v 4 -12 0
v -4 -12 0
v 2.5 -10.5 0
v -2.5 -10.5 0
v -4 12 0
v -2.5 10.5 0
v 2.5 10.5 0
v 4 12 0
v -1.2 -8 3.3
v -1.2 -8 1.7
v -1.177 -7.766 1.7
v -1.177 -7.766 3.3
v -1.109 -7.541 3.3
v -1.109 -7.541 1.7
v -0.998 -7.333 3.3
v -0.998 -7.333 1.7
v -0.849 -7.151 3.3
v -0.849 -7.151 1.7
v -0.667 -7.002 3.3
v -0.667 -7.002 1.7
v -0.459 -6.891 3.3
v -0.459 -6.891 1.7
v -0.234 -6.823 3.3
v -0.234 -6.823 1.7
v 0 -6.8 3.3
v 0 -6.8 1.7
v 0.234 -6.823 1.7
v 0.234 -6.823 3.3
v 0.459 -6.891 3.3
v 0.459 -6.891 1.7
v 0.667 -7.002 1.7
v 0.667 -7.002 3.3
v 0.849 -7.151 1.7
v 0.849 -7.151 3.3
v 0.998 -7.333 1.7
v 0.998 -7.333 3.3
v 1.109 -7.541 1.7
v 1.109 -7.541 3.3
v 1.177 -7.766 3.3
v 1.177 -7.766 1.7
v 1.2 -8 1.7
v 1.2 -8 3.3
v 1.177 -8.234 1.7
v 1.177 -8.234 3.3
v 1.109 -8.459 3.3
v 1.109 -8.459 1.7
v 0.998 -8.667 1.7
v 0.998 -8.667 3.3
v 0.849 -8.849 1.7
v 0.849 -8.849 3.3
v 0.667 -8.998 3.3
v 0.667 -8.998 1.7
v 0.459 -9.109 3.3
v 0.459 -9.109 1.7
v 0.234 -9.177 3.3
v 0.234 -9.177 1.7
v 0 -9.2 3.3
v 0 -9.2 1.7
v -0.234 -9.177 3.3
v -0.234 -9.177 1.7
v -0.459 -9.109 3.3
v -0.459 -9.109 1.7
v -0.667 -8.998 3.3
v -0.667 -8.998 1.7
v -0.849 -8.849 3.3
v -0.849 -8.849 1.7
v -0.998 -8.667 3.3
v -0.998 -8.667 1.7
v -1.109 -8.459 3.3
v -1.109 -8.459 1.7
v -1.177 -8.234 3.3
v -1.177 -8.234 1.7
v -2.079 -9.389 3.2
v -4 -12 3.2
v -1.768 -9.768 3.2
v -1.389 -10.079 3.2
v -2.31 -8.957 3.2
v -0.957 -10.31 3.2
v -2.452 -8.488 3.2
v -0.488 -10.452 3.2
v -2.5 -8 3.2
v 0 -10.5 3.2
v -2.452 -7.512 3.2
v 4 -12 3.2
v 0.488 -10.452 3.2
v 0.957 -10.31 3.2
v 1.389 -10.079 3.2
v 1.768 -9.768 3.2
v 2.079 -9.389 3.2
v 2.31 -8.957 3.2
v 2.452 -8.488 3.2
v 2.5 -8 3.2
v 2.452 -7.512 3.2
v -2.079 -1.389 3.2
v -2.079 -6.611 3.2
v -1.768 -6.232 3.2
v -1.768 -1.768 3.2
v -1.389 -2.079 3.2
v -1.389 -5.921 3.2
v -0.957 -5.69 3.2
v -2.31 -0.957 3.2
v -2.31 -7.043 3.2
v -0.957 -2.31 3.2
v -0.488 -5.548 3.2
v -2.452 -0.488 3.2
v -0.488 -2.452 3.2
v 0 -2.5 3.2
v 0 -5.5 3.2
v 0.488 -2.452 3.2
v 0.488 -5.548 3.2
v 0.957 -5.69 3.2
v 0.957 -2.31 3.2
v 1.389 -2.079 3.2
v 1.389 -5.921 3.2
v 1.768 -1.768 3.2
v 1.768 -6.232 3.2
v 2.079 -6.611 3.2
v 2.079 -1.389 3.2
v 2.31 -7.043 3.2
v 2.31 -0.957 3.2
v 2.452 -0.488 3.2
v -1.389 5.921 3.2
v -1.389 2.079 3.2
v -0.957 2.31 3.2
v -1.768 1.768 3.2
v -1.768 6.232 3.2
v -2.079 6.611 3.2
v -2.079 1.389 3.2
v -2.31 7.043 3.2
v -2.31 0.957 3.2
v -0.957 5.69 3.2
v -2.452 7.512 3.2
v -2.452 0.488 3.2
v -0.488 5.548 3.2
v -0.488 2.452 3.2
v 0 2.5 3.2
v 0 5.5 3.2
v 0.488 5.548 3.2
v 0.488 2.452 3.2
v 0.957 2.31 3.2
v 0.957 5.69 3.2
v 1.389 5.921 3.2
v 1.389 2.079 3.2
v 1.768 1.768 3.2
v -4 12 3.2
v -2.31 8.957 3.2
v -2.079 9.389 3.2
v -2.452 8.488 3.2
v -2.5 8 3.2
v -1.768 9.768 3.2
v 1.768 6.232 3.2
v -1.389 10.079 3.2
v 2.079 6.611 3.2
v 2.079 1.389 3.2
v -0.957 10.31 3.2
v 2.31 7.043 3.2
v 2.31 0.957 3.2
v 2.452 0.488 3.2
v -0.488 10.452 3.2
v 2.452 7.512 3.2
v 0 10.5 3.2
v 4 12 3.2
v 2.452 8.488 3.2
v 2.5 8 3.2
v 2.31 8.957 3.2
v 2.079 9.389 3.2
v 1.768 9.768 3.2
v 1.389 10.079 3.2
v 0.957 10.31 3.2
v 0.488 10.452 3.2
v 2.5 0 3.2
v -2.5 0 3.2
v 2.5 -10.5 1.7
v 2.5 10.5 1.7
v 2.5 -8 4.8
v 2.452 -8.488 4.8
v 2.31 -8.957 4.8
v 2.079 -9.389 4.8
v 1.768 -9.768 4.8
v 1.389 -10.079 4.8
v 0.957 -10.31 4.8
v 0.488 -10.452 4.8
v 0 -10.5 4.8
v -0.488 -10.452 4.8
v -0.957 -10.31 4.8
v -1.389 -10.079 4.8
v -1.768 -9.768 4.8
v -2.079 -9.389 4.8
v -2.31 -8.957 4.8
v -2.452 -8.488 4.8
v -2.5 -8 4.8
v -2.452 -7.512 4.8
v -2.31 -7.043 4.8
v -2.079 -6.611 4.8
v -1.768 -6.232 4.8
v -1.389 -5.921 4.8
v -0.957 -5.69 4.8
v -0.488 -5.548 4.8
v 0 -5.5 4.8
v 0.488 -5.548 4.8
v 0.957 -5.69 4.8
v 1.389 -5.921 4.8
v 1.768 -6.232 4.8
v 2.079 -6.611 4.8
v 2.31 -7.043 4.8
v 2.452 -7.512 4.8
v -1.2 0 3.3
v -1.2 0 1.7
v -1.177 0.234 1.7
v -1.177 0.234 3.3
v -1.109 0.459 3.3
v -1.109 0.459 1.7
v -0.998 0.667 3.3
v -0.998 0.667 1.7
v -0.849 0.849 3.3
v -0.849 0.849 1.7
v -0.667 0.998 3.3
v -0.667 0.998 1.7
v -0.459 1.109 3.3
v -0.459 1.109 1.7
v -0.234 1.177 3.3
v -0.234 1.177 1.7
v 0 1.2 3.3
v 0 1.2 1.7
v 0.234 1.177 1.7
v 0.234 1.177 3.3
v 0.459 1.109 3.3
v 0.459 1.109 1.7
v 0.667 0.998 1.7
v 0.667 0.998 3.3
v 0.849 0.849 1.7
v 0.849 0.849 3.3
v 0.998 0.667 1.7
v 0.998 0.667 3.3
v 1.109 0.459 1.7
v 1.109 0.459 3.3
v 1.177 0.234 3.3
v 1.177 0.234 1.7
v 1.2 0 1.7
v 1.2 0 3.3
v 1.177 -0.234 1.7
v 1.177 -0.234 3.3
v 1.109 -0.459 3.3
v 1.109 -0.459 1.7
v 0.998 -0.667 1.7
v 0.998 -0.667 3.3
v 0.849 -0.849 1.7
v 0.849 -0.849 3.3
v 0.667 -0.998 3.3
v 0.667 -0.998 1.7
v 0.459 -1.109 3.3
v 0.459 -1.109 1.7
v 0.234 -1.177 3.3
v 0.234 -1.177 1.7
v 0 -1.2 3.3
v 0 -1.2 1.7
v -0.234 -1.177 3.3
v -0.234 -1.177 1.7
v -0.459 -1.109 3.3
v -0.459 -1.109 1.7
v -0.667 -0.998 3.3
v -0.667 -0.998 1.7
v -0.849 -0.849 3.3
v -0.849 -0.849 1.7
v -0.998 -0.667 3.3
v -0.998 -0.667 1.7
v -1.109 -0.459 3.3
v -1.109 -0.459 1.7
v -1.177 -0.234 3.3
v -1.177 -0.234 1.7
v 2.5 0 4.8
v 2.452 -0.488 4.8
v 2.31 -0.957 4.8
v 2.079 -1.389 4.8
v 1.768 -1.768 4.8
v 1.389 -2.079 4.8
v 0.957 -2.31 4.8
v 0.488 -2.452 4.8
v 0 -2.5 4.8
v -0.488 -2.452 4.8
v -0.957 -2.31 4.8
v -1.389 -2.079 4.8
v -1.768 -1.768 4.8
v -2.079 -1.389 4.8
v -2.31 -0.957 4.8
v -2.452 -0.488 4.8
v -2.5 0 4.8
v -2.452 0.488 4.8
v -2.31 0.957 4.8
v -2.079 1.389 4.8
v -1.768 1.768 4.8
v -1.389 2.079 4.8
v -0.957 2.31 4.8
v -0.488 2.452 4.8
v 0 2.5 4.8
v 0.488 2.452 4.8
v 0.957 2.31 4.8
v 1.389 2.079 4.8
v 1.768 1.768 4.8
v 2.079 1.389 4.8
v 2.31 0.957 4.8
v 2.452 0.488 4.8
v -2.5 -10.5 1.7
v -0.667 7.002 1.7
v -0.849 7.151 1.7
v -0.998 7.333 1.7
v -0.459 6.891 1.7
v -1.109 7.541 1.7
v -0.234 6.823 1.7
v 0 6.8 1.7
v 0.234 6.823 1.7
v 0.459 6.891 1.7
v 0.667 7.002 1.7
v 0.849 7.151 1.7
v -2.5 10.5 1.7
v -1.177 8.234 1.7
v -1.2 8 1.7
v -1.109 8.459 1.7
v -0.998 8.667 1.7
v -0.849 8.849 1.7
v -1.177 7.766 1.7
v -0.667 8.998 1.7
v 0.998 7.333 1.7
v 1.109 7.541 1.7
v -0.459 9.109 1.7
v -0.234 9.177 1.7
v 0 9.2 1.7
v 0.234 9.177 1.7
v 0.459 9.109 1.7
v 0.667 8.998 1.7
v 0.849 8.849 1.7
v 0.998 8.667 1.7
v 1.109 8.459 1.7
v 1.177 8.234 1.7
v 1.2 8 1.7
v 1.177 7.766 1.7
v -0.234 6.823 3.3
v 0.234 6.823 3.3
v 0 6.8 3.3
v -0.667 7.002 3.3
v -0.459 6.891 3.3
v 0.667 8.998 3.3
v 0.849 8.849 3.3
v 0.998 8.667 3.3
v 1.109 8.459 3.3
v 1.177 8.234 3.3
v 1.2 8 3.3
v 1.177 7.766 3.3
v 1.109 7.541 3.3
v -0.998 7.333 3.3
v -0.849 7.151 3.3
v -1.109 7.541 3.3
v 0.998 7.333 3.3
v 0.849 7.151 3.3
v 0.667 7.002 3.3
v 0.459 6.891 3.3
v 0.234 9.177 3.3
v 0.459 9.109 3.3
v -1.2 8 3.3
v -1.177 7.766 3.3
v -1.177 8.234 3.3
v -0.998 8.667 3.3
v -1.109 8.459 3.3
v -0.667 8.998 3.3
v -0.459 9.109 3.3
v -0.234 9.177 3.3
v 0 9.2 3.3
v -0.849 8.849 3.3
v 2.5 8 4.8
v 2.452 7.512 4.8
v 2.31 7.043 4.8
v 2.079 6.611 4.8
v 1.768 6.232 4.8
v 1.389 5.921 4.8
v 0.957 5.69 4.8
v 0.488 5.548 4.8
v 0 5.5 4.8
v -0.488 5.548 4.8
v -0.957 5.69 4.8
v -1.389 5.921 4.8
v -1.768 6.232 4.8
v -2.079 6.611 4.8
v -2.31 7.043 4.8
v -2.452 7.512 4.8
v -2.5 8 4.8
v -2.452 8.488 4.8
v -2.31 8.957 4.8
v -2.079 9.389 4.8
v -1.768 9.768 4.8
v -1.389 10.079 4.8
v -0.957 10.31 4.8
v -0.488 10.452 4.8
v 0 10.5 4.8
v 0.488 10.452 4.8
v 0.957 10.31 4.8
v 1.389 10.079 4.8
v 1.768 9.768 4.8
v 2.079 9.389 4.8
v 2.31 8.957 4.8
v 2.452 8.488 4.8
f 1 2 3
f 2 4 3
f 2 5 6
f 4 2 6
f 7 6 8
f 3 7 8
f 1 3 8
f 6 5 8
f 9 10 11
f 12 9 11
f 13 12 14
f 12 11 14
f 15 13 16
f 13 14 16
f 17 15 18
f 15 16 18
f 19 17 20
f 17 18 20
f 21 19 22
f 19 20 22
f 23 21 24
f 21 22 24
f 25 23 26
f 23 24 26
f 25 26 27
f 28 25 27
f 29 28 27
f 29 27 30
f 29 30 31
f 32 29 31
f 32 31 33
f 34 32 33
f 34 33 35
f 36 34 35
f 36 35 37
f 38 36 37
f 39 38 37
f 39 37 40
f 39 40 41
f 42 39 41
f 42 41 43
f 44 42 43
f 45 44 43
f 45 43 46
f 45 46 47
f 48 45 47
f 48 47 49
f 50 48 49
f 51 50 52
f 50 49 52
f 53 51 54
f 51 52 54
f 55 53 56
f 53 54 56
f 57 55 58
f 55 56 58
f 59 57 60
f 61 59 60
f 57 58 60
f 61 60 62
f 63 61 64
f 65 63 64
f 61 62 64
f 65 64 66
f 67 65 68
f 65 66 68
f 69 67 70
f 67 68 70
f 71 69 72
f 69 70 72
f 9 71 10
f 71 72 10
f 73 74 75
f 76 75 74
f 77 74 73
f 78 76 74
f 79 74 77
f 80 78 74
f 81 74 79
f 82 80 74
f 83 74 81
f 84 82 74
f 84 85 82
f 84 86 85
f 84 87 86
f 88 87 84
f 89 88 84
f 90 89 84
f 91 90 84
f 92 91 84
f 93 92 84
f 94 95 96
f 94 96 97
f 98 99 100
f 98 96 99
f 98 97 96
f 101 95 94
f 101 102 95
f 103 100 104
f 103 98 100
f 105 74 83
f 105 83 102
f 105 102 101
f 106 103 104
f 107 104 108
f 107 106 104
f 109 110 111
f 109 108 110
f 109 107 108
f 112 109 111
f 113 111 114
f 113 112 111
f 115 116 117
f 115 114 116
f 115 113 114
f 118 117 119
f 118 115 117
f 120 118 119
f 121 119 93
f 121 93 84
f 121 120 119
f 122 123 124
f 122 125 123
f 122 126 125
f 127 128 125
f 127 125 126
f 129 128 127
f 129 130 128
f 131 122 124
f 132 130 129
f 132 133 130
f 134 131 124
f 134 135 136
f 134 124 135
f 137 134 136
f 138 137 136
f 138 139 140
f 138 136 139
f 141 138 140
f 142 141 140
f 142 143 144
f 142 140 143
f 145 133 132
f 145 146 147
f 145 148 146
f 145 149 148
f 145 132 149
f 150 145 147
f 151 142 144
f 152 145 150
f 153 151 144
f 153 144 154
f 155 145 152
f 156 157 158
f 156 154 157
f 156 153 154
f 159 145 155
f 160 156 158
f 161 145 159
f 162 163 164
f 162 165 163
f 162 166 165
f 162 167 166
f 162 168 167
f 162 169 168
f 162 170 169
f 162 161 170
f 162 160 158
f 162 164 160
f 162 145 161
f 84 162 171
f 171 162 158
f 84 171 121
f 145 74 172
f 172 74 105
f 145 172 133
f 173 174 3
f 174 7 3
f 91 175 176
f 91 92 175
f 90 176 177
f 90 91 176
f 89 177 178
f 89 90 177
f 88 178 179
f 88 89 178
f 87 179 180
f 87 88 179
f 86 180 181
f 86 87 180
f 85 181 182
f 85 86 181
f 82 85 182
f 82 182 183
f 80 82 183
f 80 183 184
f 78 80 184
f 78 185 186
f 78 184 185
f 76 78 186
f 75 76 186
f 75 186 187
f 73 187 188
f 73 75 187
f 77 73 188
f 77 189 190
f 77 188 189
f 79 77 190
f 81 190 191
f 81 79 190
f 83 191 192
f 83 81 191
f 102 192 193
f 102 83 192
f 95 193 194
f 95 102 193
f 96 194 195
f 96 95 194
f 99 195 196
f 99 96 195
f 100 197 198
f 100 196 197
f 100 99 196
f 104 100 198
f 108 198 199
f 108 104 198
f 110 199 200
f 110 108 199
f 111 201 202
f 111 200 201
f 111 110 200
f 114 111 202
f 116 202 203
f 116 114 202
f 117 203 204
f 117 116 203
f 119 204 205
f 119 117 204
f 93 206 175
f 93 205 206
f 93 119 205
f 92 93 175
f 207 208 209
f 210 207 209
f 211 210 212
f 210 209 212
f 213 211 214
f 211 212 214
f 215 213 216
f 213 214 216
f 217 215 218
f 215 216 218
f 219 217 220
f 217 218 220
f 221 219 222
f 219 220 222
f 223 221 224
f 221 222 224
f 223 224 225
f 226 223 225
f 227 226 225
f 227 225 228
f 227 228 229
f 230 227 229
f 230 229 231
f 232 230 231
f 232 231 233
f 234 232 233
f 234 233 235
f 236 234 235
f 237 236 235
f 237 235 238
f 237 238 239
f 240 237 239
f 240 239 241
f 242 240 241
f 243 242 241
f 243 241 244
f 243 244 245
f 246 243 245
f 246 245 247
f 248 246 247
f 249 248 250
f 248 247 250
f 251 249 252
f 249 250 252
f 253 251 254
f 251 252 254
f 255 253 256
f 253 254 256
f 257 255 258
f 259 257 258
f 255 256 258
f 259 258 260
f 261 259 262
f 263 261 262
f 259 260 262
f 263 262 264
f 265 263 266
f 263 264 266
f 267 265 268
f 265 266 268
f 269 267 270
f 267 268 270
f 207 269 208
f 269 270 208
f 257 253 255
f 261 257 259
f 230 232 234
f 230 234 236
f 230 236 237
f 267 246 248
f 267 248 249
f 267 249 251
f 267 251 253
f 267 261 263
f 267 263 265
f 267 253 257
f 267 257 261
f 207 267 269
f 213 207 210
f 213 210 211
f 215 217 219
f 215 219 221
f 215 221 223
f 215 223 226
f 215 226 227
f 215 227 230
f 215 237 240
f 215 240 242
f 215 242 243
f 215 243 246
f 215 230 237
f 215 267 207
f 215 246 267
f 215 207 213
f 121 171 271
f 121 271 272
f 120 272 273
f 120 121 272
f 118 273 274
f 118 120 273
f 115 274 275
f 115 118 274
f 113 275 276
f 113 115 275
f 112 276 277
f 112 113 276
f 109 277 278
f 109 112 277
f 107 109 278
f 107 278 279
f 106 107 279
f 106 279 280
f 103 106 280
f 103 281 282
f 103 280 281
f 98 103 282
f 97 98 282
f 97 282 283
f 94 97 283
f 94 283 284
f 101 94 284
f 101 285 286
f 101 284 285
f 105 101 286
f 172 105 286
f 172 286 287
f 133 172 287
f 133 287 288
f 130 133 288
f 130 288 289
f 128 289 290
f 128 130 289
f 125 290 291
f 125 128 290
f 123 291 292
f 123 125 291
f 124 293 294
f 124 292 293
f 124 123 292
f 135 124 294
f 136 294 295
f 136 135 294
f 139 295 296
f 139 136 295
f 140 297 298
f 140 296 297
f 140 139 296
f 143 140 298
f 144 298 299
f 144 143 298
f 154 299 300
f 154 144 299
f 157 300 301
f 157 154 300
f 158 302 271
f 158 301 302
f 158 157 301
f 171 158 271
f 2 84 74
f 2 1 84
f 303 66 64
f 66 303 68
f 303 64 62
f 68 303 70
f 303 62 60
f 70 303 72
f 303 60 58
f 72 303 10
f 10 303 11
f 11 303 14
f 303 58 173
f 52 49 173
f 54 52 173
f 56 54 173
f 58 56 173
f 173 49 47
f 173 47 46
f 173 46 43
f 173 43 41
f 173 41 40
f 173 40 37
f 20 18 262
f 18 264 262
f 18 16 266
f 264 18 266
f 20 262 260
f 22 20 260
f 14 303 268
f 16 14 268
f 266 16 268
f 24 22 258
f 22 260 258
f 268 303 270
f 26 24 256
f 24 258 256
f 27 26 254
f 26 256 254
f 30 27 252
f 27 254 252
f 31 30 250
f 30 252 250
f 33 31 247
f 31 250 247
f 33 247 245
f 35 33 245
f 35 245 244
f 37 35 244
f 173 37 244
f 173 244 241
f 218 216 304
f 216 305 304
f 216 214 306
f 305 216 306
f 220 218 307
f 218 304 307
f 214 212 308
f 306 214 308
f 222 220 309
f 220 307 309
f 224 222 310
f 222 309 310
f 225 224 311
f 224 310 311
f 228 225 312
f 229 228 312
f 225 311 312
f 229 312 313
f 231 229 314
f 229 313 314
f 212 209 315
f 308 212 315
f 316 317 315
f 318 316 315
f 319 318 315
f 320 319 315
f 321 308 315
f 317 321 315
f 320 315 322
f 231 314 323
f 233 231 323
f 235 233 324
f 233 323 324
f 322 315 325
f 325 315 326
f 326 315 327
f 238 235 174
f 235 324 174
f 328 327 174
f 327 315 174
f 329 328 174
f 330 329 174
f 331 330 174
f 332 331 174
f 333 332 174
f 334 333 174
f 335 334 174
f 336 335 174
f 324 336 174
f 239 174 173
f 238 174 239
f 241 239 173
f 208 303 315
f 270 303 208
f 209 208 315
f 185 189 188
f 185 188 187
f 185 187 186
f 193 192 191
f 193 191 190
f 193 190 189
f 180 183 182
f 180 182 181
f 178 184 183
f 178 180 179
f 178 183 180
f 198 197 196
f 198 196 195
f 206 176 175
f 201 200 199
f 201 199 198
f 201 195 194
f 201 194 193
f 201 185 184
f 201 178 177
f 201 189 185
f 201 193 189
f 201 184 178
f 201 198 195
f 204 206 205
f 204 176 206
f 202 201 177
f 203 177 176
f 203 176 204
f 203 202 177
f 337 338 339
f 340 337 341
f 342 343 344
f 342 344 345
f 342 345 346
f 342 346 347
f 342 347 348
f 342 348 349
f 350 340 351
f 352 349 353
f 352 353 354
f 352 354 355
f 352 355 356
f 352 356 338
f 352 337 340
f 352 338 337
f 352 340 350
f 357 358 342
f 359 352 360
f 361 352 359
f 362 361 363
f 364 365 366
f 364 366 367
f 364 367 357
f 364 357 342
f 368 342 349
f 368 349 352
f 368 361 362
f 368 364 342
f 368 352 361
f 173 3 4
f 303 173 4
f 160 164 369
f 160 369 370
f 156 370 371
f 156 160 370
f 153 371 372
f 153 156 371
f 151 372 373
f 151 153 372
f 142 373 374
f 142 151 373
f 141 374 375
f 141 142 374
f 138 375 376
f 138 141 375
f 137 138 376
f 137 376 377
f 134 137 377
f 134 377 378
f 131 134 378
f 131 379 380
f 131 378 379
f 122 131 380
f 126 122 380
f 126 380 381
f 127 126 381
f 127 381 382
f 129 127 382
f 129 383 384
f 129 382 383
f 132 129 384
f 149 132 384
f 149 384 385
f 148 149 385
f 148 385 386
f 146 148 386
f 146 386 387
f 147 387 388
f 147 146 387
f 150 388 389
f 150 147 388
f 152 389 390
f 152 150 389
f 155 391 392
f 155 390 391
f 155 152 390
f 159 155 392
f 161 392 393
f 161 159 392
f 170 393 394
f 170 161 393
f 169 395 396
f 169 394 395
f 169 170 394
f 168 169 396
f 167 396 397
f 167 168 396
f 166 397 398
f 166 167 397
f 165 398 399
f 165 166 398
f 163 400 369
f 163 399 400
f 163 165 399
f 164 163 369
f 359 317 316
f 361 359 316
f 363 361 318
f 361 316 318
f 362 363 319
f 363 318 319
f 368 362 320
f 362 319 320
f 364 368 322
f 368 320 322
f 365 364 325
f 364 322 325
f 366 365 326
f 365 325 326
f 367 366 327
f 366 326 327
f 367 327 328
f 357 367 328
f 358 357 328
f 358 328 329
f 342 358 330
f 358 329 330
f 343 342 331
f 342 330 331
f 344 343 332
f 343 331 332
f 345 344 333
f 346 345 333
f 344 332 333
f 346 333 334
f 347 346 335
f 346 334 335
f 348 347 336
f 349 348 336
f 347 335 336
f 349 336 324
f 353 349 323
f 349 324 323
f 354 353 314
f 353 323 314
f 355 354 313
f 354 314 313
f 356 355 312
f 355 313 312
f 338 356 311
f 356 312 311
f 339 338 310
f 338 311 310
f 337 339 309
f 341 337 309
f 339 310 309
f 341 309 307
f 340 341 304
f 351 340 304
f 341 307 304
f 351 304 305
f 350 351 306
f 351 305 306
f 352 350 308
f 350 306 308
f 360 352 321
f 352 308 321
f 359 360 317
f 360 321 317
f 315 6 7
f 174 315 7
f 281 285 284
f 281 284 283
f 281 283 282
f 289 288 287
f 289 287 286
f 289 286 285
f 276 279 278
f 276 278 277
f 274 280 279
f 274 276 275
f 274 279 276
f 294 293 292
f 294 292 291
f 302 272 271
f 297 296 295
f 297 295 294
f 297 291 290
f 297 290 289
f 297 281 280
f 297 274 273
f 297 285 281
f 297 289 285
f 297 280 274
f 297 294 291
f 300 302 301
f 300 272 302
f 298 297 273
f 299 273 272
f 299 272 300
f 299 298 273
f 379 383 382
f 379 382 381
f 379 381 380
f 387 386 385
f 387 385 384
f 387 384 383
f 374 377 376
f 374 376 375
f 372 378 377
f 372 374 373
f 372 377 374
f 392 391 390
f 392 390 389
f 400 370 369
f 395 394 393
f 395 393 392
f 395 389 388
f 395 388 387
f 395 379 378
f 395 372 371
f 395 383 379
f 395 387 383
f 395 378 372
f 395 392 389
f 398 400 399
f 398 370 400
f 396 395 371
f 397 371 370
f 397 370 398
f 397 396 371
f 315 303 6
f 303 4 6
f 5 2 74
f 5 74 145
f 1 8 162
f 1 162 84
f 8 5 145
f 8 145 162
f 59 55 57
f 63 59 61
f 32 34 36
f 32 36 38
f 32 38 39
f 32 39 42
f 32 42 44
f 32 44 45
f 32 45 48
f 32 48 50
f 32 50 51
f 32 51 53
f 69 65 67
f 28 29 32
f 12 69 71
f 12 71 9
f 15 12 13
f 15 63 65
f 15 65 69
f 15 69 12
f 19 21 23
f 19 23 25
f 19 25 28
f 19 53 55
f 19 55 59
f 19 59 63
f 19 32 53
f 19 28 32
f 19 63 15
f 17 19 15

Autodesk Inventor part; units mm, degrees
ref_plane "YZ Plane" through (0, 0, 0) normal (1, 0, 0) x (0, 1, 0)
ref_plane "XZ Plane" through (0, 0, 0) normal (0, 1, 0) x (-1, 0, 0)
ref_plane "XY Plane" through (0, 0, 0) normal (0, 0, 1) x (1, 0, 0)
sketch "Sketch1" plane through (0, 0, 0) normal (0, 0, 1) x (1, 0, 0)
  line L0 (-4, 12) -> (4, 12)
  line L1 (4, 12) -> (4, -12)
  line L2 (4, -12) -> (-4, -12)
  line L3 (-4, -12) -> (-4, 12)
  point P0 (0, 0)
  dimension "d0" = 8
  dimension "d1" = 24
  dimension "d2" = 4
  dimension "d3" = 12
extrude "Extrusion1" add sketch "Sketch1" along normal blind 3.2
shell "Shell1" thickness 1.5 removed faces 1 at (-1.3333, 4, 0)
sketch "Sketch2" plane through (0, 0, 3.2) normal (0, 0, 1) x (1, 0, 0)
  circle A0 centre (0, -8) radius 2.5
  line L0 (4, 12) -> (4, -12) projected
  line L1 (4, -12) -> (-4, -12) projected
  dimension "d7" = 5
  dimension "d10" = 4
  dimension "d11" = 4
extrude "Extrusion2" add sketch "Sketch2" along normal blind 1.6
sketch "Sketch3" plane through (2.5, -10.5, 1.7) normal (0, 0, -1) x (-1, 0, 0)
  circle A0 centre (2.5, 2.5) radius 2.5 projected
  circle A1 centre (2.5, 2.5) radius 1.2
  point P0 (2.5, 10.5)
  dimension "d18" = 2.4
extrude "Extrusion3" cut sketch "Sketch3" against normal blind 1.6 contours A1
pattern_linear "Rectangular Pattern1" count 3 spacing 8 along (0, 1, 0) of "Extrusion2", "Extrusion3"
sketch "Sketch4" plane through (2.5, -10.5, 1.7) normal (0, 0, -1) x (-1, 0, 0)
  circle A0 centre (2.5, 10.5) radius 1.2 projected
  circle A1 centre (2.5, 2.5) radius 1.2 projected
  line L0 (0, 21) -> (0, 0) projected
  line L1 (0, 0) -> (5, 0) projected
  circle A2 centre (6.5, 6.5) radius 3.15
  circle A3 centre (6.5, 6.5) radius 2.5
  point P0 (2.5, 10.5)
  dimension "d21" = 6.5
  dimension "d22" = 6.5
  dimension "d23" = 10.5
  dimension "d24" = 2.5
  dimension "d25" = 5
  dimension "d26" = 6.3
extrude "Extrusion4" [suppressed]
pattern_linear "Rectangular Pattern2" [suppressed]
equation "\"d0\" = 8 * WIDTH"
equation "\"d1\" = 8 * LENGTH"
equation "\"d2\" = 0.5 * d0"
equation "\"d3\" = 0.5 * d1"
equation "\"d4\" = HEIGHT"
equation "\"d21\" = 0.5 * d23 + 0.5 * d24"
equation "\"d22\" = d21"
equation "\"WIDTH\" = 1"
equation "\"HEIGHT\" = 3.2"
equation "\"LENGTH\" = 3"
properties part number "3623" material "Steel"
